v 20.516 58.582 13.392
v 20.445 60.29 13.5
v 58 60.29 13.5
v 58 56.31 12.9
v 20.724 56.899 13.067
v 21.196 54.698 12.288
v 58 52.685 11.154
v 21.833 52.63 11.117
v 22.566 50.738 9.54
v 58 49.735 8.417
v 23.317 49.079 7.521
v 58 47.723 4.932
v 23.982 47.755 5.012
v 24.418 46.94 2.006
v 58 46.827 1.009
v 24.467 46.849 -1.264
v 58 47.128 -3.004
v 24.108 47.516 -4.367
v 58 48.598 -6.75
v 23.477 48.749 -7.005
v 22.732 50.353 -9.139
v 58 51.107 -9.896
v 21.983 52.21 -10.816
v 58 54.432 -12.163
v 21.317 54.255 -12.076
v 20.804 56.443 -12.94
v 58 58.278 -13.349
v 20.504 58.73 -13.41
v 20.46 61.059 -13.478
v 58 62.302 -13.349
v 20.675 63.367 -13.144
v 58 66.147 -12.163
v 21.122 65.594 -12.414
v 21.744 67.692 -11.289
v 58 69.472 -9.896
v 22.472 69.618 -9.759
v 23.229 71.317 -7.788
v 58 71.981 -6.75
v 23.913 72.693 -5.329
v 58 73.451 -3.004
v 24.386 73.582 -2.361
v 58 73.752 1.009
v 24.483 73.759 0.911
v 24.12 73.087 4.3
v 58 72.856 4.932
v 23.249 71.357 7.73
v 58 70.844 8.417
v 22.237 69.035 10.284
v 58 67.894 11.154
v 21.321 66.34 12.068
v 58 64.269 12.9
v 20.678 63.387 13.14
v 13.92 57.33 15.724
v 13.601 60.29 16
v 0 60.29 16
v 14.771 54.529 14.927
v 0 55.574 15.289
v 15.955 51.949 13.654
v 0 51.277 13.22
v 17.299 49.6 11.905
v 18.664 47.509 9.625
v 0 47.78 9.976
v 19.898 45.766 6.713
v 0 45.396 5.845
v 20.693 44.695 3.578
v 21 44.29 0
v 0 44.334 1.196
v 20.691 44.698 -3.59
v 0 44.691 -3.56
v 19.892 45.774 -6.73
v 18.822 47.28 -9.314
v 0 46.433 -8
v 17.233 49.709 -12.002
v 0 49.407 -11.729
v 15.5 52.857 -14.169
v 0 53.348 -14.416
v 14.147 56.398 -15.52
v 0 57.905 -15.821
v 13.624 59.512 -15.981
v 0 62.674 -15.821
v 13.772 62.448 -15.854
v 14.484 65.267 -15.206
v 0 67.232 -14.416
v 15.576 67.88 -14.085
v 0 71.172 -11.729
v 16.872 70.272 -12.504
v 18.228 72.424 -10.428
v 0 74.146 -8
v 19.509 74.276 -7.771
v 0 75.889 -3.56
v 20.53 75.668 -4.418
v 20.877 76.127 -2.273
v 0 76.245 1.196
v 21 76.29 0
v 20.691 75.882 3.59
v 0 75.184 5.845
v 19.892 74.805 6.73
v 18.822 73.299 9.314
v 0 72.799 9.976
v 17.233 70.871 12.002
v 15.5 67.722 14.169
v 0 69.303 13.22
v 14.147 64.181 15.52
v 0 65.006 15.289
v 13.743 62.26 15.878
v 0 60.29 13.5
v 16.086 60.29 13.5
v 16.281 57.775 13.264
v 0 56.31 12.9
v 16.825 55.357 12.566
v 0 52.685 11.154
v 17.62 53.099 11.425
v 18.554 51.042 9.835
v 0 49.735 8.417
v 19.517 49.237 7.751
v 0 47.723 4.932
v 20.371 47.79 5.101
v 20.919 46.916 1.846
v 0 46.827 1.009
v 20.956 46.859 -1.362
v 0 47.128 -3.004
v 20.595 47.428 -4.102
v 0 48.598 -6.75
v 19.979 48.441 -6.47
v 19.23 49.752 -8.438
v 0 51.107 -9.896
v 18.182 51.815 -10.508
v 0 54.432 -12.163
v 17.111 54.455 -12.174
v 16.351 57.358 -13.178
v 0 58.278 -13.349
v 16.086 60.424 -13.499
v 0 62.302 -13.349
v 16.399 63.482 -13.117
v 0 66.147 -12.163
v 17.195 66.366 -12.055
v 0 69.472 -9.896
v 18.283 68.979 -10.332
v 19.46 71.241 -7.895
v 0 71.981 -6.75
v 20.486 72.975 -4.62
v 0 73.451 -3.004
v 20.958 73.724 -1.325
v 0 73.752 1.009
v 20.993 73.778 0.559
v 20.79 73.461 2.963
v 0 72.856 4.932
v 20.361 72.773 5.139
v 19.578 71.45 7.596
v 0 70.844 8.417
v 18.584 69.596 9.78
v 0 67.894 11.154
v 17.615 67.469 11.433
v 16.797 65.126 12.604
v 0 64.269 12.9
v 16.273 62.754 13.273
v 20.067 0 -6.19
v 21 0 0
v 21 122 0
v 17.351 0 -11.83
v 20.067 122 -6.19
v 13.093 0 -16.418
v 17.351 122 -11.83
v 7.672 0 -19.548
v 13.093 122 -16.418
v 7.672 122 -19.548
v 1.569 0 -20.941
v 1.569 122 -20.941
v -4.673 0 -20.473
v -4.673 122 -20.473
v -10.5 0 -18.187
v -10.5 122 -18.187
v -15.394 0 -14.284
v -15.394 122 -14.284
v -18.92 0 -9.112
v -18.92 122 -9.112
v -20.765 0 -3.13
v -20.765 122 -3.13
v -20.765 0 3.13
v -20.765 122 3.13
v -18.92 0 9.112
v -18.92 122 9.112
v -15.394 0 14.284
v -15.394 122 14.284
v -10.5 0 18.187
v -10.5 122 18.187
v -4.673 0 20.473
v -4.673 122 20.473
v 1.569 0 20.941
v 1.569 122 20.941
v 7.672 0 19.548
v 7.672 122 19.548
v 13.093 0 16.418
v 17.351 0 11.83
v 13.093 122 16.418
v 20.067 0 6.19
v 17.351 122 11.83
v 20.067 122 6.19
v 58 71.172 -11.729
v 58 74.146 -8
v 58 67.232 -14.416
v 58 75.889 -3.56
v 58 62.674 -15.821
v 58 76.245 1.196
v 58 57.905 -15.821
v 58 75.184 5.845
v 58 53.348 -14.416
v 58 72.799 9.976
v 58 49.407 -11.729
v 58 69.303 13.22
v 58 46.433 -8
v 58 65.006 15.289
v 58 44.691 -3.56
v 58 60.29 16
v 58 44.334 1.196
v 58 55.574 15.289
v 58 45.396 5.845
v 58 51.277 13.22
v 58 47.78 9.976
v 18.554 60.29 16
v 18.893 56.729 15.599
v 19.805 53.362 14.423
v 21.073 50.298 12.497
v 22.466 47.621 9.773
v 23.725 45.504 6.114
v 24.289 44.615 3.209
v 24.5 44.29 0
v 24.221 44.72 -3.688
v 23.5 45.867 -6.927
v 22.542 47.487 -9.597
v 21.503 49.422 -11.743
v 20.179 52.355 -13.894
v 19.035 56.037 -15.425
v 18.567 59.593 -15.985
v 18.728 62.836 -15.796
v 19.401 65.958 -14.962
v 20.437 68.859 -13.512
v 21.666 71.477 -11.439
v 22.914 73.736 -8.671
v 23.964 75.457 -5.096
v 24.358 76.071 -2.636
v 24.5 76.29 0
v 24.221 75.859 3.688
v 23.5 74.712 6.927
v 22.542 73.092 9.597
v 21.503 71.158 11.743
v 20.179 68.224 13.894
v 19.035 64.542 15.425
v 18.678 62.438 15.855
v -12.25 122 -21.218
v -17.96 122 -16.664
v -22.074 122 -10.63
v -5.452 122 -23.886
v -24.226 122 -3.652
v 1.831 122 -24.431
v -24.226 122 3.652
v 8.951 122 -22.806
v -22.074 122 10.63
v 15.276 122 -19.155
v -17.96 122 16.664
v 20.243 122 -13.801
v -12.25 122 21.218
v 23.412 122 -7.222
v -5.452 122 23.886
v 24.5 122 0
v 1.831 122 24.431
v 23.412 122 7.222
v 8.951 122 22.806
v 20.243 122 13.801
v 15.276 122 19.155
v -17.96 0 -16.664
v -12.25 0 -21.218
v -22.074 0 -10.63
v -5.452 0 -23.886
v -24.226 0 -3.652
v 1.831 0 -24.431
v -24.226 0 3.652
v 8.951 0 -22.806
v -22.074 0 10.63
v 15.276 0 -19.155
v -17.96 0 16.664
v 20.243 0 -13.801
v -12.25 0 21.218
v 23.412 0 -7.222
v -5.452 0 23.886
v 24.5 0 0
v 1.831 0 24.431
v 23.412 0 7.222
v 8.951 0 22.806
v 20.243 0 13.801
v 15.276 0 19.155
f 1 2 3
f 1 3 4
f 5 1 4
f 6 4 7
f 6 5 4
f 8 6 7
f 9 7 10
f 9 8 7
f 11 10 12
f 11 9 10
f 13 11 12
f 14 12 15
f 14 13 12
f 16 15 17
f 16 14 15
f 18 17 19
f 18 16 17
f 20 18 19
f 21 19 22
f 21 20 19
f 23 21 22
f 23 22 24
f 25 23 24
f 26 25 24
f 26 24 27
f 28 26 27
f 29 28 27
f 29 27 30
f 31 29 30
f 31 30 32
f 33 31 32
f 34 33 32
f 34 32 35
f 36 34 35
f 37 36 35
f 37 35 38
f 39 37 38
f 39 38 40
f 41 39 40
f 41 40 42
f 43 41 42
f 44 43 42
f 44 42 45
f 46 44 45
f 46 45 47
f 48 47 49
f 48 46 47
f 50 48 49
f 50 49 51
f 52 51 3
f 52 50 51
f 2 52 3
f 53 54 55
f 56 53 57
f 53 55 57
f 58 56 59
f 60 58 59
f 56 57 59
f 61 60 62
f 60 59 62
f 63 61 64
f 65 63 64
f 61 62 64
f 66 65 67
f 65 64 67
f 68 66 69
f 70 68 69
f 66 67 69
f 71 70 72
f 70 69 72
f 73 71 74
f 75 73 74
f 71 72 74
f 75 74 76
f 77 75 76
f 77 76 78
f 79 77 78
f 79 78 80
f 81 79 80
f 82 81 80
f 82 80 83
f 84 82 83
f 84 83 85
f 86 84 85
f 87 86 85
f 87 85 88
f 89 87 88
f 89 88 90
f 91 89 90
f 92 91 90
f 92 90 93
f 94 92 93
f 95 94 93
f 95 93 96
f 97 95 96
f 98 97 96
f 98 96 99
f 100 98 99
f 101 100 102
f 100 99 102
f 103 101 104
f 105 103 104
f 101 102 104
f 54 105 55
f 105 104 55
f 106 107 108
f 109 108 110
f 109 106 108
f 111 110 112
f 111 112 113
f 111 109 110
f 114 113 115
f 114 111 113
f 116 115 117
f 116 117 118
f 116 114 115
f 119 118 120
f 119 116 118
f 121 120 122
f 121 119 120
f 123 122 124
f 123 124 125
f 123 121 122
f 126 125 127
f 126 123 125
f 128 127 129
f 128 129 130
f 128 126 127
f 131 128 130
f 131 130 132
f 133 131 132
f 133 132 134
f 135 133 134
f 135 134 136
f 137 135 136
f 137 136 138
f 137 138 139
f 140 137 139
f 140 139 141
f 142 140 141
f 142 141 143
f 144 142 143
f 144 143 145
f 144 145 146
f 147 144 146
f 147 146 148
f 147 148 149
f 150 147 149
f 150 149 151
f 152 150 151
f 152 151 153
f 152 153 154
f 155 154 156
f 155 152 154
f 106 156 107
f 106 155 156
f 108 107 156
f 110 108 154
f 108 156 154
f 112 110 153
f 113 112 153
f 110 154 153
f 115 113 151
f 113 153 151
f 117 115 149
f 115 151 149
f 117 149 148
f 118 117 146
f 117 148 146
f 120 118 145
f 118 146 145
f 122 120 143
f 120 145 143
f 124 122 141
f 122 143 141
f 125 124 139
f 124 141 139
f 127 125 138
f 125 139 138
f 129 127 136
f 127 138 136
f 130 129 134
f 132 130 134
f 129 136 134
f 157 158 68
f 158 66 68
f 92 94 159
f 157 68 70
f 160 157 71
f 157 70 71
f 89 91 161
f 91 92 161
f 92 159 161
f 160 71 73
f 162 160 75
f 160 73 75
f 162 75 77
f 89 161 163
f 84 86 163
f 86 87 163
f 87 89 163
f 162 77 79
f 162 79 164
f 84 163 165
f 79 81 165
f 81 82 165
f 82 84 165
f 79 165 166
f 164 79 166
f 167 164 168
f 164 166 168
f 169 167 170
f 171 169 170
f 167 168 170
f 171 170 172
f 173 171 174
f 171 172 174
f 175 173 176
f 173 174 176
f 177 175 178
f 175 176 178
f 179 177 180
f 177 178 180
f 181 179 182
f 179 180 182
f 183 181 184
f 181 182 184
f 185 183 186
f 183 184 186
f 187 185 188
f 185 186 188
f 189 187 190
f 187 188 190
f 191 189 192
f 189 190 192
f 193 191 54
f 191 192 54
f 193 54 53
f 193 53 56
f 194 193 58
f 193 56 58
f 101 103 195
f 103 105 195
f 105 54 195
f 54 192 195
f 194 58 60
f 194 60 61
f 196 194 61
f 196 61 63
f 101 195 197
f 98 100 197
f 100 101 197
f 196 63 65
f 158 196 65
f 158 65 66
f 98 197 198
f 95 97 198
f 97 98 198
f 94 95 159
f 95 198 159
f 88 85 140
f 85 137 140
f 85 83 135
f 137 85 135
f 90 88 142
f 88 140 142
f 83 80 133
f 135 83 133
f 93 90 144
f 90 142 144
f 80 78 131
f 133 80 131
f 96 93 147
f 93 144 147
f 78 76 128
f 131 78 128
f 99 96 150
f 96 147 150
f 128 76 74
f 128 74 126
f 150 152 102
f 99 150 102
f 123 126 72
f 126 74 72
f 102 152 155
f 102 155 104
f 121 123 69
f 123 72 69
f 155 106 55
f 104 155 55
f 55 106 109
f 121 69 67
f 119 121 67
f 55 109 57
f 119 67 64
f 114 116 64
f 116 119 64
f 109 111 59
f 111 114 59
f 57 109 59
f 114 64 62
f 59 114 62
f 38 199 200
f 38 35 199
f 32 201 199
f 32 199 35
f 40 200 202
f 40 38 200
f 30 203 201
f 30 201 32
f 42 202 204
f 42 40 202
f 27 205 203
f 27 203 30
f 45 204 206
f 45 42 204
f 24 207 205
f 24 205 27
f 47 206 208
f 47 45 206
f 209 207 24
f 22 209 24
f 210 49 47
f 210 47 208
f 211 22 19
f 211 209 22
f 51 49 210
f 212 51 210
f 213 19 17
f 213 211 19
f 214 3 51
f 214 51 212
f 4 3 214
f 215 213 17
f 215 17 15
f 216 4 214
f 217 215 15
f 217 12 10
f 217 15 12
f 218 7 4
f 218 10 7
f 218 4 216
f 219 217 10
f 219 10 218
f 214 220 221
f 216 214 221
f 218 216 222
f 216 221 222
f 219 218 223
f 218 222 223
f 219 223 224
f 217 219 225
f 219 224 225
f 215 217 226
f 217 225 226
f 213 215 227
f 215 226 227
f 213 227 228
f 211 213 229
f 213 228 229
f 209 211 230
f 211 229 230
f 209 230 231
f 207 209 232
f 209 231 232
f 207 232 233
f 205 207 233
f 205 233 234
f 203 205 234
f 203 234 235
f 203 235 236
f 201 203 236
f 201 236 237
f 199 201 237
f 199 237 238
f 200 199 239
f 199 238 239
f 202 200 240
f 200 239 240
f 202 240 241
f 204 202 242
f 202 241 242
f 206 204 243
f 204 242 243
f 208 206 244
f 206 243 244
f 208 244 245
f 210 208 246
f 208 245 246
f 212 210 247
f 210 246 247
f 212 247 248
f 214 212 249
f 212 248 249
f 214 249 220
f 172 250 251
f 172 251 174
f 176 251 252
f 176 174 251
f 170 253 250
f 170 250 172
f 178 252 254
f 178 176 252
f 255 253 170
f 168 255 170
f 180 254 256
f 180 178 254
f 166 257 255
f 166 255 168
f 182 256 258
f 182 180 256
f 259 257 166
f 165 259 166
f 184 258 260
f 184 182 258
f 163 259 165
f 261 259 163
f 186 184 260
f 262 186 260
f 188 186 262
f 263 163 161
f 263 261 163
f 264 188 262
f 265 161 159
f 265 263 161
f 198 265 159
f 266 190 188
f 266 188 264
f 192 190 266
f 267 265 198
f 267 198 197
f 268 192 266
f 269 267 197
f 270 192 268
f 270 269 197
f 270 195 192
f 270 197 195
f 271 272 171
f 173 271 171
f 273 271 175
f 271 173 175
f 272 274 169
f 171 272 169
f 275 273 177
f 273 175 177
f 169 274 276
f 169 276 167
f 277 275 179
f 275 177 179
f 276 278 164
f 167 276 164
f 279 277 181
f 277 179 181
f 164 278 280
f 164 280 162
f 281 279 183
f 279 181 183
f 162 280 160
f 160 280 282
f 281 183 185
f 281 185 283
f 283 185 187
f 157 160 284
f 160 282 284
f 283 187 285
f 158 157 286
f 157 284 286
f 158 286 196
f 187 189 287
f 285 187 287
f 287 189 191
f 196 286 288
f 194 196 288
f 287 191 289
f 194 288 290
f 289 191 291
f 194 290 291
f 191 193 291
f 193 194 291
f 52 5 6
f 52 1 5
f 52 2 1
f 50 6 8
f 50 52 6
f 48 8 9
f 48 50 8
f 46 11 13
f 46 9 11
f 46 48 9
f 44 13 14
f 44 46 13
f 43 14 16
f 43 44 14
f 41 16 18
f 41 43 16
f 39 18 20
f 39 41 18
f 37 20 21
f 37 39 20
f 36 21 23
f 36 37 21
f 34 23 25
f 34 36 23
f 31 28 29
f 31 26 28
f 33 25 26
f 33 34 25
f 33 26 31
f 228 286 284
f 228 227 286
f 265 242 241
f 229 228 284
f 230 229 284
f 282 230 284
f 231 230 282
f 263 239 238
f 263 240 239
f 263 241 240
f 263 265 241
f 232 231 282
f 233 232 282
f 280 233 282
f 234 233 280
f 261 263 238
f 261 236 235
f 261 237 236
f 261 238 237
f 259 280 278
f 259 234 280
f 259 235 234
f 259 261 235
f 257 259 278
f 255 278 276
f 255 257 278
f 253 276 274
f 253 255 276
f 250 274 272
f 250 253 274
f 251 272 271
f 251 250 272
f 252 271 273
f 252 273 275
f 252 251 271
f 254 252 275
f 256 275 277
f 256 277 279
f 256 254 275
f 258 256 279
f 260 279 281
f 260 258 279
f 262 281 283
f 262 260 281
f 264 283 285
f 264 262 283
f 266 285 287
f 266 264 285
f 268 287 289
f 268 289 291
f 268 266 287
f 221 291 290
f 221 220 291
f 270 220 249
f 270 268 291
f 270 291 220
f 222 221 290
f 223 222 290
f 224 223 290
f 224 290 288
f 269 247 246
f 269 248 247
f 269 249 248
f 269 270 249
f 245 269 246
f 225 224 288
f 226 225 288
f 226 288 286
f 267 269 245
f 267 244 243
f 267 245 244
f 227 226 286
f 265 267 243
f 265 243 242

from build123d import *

# Parameters (mm, degrees)
SKETCH1_R           = 24.5
SKETCH1_R_2         = 21
SKETCH5_R           = 16
SKETCH5_R_2         = 13.5
BOSS_EXTRUDE3_DEPTH = 58


with BuildPart() as part:
    # Sweep2: sweep along a path in Sketch2
    with BuildLine(Plane.XY) as sweep2_path:
        Line((0, 0), (0, 122))
    # Sketch1 → Sweep2 (sweep)
    with BuildSketch(Plane(origin=(0, 0, 0), x_dir=(1, 0, 0), z_dir=(0, 1, 0))):
        Circle(SKETCH1_R)
        Circle(SKETCH1_R_2, mode=Mode.SUBTRACT)
    sweep(path=sweep2_path.line)

    # Sketch5 → Boss-Extrude3 (add)
    with BuildSketch(Plane(origin=(0, 0, 0), x_dir=(0, 0, -1), z_dir=(1, 0, 0))):
        with Locations(Location((0, 60.289677485, 0), (0, 0, 180))):
            Circle(SKETCH5_R)
        with Locations(Location((0, 60.289677485, 0), (0, 0, 180))):
            Circle(SKETCH5_R_2, mode=Mode.SUBTRACT)
    extrude(amount=BOSS_EXTRUDE3_DEPTH)


solid = part.part
